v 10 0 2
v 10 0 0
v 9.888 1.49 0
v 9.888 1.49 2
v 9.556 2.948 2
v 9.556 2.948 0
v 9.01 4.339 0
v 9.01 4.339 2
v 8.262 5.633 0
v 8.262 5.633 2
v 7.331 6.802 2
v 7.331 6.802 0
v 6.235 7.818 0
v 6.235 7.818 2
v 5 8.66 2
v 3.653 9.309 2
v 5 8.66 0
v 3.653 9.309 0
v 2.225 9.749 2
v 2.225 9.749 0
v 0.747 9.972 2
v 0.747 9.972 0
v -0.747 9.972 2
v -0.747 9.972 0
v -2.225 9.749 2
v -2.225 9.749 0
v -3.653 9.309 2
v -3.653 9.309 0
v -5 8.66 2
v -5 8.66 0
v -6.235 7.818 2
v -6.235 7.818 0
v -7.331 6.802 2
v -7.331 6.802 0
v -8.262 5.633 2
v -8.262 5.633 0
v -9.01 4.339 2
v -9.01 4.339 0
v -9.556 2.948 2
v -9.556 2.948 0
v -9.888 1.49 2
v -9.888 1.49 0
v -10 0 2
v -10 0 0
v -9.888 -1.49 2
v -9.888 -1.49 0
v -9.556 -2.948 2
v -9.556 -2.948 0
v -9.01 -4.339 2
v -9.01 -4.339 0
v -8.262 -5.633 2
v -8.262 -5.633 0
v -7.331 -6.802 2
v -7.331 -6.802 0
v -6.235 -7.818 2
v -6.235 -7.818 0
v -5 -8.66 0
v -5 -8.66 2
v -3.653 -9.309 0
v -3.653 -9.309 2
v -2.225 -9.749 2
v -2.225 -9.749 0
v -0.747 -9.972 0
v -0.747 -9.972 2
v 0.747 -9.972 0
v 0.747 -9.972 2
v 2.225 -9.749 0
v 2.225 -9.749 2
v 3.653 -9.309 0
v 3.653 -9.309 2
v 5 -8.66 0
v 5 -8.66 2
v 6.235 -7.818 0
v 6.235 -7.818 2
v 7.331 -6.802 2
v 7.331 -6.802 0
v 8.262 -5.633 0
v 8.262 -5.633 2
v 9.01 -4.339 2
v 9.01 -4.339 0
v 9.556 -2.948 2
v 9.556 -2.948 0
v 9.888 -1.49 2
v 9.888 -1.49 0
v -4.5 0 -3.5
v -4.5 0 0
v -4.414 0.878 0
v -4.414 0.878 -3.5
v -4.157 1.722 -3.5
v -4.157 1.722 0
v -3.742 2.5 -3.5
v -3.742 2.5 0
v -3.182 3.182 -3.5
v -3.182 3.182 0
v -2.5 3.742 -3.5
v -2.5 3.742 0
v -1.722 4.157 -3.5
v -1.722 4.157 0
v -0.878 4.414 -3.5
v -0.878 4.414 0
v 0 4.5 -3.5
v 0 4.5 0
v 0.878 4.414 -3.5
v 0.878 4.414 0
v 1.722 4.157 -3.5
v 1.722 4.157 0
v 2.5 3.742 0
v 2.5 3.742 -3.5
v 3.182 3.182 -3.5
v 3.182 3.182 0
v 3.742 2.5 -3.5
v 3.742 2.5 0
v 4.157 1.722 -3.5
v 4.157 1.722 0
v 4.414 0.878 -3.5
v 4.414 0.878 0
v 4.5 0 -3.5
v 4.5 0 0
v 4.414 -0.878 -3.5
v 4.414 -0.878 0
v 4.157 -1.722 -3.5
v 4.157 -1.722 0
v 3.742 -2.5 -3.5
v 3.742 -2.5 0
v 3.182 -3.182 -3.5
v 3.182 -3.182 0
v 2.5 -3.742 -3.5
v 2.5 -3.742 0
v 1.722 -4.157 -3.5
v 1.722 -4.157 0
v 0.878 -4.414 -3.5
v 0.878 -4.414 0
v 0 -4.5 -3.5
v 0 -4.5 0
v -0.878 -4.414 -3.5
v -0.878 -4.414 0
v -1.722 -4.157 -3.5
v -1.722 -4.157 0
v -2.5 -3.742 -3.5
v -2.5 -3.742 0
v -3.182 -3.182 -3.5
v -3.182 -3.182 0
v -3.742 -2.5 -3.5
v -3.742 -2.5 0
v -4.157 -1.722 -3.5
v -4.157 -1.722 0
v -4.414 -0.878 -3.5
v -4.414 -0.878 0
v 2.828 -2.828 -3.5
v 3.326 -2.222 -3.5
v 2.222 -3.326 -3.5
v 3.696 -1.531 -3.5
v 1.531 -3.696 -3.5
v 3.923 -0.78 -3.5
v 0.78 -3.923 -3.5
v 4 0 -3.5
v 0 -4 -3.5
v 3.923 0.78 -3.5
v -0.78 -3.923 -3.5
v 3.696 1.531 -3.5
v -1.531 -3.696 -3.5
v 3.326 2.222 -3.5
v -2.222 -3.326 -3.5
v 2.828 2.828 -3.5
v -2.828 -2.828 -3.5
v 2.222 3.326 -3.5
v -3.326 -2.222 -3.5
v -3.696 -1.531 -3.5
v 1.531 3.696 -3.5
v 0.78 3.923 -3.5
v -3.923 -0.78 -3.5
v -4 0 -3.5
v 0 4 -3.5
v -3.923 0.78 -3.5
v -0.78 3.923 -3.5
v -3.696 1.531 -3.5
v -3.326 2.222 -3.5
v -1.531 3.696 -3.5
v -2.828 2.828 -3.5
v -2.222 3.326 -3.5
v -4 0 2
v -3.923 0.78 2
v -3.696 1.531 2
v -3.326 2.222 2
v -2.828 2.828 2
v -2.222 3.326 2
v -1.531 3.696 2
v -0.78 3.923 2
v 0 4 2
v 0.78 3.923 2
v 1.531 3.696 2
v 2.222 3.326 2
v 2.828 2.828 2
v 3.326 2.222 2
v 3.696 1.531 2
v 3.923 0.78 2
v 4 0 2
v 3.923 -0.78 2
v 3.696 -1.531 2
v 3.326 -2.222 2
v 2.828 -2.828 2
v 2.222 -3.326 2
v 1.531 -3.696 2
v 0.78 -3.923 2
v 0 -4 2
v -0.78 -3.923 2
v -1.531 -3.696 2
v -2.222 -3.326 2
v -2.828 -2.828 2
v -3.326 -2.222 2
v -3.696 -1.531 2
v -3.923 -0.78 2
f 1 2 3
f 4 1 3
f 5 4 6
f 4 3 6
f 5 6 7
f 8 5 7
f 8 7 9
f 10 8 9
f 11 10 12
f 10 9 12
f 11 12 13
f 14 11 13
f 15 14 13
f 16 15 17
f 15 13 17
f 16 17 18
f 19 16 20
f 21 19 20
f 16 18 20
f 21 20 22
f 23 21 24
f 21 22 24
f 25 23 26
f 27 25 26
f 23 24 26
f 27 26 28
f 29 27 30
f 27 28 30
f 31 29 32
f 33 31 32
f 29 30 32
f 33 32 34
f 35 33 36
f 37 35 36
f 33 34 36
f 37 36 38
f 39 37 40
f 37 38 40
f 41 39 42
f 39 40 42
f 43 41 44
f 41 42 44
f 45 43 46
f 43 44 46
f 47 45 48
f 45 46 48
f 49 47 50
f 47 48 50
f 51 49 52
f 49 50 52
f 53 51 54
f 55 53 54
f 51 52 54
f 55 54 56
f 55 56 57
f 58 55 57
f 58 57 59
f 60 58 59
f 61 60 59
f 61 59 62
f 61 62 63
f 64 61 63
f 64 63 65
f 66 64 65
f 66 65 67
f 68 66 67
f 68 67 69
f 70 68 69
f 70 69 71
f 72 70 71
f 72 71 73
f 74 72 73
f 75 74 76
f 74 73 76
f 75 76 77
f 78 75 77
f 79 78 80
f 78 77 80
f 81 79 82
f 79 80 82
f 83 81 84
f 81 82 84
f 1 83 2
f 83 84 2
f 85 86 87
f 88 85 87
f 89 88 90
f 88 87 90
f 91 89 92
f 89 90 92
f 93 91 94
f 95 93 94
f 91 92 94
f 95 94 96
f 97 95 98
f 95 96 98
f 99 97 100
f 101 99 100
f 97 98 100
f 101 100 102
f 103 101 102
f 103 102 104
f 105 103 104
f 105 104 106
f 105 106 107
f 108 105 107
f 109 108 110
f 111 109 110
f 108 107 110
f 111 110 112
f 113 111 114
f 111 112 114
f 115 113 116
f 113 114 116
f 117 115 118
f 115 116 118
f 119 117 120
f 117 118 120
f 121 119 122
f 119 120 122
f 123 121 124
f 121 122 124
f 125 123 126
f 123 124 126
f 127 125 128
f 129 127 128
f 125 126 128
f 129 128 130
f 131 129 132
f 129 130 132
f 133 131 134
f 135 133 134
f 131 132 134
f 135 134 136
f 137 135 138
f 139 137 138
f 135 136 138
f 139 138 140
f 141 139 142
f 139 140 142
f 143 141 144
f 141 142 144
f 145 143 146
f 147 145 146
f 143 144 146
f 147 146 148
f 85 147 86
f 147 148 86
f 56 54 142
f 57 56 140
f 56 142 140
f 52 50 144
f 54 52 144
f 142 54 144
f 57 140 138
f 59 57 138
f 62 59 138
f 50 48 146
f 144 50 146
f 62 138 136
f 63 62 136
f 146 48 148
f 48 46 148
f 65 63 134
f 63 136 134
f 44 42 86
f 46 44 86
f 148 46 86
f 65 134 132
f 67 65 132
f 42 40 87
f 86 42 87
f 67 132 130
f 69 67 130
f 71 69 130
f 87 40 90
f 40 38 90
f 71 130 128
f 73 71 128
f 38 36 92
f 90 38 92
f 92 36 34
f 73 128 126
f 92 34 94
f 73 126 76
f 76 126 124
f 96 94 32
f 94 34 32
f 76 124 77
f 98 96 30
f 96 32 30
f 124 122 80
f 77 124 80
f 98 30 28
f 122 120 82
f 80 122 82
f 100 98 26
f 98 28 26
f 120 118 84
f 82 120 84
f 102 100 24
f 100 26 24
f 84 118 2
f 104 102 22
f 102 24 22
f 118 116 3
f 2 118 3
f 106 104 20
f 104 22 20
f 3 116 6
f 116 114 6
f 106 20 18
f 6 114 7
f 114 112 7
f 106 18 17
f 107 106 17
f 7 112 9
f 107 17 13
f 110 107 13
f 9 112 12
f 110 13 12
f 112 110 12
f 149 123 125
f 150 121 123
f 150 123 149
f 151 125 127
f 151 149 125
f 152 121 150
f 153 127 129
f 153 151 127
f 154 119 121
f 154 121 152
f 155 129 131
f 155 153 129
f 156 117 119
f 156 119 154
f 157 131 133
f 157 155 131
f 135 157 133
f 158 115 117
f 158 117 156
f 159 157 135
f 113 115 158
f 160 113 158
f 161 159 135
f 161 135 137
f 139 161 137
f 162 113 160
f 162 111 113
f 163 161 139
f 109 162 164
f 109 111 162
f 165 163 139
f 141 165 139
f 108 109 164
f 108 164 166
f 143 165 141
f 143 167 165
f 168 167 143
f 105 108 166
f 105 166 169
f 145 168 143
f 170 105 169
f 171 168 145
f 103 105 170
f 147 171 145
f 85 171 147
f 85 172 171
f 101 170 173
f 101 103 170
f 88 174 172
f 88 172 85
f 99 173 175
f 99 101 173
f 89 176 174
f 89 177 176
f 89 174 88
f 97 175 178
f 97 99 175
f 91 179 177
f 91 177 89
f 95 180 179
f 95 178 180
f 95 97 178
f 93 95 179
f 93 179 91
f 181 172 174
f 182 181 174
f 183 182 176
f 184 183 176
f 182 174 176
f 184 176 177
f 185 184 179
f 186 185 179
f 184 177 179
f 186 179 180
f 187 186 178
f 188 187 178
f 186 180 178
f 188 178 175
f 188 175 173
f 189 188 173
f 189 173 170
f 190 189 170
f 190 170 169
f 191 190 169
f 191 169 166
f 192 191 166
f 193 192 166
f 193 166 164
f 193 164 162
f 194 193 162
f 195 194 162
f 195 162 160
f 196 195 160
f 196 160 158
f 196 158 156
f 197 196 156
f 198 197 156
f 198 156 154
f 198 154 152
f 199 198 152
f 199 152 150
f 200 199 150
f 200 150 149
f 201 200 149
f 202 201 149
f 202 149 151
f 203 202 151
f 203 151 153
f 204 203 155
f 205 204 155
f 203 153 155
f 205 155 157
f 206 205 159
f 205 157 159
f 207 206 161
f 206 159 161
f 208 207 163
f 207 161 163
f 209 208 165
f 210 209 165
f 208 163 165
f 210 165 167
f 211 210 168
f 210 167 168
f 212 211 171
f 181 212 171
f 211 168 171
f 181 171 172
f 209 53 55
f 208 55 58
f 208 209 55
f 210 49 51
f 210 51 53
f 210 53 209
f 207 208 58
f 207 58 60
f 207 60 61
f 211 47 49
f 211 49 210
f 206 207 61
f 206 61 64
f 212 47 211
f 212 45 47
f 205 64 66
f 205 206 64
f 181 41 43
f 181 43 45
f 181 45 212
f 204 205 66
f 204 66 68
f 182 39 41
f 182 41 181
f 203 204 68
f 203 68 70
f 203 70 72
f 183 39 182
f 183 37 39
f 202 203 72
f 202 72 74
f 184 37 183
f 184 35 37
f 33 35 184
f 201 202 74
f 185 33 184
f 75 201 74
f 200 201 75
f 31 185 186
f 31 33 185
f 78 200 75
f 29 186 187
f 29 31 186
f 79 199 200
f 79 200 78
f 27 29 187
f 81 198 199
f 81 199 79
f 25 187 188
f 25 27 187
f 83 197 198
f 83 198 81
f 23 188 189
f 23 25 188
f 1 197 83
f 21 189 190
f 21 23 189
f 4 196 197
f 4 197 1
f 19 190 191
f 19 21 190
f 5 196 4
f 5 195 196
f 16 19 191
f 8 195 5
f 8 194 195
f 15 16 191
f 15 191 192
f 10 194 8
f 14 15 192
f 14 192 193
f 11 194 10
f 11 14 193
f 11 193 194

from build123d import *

# Parameters (mm, degrees)
SKETCH1_R           = 10
BOSS_EXTRUDE1_DEPTH = 2
SKETCH2_R           = 4.5
BOSS_EXTRUDE2_DEPTH = 3.5
SKETCH3_R           = 4
CUT_EXTRUDE1_DEPTH  = 6.5


with BuildPart() as part:
    # Sketch1 → Boss-Extrude1 (new body)
    with BuildSketch(Plane.XY):
        Circle(SKETCH1_R)
    extrude(amount=BOSS_EXTRUDE1_DEPTH)

    # Sketch2 → Boss-Extrude2 (add)
    with BuildSketch(Plane(origin=(0, 0, 0), x_dir=(-1, 0, 0), z_dir=(0, 0, -1))):
        Circle(SKETCH2_R)
    extrude(amount=BOSS_EXTRUDE2_DEPTH)

    # Sketch3 → Cut-Extrude1 (cut, through all)
    with BuildSketch(Plane(origin=(0, 0, -3.5), x_dir=(-1, 0, 0), z_dir=(0, 0, -1))):
        Circle(SKETCH3_R)
    extrude(amount=-CUT_EXTRUDE1_DEPTH, mode=Mode.SUBTRACT)


solid = part.part
